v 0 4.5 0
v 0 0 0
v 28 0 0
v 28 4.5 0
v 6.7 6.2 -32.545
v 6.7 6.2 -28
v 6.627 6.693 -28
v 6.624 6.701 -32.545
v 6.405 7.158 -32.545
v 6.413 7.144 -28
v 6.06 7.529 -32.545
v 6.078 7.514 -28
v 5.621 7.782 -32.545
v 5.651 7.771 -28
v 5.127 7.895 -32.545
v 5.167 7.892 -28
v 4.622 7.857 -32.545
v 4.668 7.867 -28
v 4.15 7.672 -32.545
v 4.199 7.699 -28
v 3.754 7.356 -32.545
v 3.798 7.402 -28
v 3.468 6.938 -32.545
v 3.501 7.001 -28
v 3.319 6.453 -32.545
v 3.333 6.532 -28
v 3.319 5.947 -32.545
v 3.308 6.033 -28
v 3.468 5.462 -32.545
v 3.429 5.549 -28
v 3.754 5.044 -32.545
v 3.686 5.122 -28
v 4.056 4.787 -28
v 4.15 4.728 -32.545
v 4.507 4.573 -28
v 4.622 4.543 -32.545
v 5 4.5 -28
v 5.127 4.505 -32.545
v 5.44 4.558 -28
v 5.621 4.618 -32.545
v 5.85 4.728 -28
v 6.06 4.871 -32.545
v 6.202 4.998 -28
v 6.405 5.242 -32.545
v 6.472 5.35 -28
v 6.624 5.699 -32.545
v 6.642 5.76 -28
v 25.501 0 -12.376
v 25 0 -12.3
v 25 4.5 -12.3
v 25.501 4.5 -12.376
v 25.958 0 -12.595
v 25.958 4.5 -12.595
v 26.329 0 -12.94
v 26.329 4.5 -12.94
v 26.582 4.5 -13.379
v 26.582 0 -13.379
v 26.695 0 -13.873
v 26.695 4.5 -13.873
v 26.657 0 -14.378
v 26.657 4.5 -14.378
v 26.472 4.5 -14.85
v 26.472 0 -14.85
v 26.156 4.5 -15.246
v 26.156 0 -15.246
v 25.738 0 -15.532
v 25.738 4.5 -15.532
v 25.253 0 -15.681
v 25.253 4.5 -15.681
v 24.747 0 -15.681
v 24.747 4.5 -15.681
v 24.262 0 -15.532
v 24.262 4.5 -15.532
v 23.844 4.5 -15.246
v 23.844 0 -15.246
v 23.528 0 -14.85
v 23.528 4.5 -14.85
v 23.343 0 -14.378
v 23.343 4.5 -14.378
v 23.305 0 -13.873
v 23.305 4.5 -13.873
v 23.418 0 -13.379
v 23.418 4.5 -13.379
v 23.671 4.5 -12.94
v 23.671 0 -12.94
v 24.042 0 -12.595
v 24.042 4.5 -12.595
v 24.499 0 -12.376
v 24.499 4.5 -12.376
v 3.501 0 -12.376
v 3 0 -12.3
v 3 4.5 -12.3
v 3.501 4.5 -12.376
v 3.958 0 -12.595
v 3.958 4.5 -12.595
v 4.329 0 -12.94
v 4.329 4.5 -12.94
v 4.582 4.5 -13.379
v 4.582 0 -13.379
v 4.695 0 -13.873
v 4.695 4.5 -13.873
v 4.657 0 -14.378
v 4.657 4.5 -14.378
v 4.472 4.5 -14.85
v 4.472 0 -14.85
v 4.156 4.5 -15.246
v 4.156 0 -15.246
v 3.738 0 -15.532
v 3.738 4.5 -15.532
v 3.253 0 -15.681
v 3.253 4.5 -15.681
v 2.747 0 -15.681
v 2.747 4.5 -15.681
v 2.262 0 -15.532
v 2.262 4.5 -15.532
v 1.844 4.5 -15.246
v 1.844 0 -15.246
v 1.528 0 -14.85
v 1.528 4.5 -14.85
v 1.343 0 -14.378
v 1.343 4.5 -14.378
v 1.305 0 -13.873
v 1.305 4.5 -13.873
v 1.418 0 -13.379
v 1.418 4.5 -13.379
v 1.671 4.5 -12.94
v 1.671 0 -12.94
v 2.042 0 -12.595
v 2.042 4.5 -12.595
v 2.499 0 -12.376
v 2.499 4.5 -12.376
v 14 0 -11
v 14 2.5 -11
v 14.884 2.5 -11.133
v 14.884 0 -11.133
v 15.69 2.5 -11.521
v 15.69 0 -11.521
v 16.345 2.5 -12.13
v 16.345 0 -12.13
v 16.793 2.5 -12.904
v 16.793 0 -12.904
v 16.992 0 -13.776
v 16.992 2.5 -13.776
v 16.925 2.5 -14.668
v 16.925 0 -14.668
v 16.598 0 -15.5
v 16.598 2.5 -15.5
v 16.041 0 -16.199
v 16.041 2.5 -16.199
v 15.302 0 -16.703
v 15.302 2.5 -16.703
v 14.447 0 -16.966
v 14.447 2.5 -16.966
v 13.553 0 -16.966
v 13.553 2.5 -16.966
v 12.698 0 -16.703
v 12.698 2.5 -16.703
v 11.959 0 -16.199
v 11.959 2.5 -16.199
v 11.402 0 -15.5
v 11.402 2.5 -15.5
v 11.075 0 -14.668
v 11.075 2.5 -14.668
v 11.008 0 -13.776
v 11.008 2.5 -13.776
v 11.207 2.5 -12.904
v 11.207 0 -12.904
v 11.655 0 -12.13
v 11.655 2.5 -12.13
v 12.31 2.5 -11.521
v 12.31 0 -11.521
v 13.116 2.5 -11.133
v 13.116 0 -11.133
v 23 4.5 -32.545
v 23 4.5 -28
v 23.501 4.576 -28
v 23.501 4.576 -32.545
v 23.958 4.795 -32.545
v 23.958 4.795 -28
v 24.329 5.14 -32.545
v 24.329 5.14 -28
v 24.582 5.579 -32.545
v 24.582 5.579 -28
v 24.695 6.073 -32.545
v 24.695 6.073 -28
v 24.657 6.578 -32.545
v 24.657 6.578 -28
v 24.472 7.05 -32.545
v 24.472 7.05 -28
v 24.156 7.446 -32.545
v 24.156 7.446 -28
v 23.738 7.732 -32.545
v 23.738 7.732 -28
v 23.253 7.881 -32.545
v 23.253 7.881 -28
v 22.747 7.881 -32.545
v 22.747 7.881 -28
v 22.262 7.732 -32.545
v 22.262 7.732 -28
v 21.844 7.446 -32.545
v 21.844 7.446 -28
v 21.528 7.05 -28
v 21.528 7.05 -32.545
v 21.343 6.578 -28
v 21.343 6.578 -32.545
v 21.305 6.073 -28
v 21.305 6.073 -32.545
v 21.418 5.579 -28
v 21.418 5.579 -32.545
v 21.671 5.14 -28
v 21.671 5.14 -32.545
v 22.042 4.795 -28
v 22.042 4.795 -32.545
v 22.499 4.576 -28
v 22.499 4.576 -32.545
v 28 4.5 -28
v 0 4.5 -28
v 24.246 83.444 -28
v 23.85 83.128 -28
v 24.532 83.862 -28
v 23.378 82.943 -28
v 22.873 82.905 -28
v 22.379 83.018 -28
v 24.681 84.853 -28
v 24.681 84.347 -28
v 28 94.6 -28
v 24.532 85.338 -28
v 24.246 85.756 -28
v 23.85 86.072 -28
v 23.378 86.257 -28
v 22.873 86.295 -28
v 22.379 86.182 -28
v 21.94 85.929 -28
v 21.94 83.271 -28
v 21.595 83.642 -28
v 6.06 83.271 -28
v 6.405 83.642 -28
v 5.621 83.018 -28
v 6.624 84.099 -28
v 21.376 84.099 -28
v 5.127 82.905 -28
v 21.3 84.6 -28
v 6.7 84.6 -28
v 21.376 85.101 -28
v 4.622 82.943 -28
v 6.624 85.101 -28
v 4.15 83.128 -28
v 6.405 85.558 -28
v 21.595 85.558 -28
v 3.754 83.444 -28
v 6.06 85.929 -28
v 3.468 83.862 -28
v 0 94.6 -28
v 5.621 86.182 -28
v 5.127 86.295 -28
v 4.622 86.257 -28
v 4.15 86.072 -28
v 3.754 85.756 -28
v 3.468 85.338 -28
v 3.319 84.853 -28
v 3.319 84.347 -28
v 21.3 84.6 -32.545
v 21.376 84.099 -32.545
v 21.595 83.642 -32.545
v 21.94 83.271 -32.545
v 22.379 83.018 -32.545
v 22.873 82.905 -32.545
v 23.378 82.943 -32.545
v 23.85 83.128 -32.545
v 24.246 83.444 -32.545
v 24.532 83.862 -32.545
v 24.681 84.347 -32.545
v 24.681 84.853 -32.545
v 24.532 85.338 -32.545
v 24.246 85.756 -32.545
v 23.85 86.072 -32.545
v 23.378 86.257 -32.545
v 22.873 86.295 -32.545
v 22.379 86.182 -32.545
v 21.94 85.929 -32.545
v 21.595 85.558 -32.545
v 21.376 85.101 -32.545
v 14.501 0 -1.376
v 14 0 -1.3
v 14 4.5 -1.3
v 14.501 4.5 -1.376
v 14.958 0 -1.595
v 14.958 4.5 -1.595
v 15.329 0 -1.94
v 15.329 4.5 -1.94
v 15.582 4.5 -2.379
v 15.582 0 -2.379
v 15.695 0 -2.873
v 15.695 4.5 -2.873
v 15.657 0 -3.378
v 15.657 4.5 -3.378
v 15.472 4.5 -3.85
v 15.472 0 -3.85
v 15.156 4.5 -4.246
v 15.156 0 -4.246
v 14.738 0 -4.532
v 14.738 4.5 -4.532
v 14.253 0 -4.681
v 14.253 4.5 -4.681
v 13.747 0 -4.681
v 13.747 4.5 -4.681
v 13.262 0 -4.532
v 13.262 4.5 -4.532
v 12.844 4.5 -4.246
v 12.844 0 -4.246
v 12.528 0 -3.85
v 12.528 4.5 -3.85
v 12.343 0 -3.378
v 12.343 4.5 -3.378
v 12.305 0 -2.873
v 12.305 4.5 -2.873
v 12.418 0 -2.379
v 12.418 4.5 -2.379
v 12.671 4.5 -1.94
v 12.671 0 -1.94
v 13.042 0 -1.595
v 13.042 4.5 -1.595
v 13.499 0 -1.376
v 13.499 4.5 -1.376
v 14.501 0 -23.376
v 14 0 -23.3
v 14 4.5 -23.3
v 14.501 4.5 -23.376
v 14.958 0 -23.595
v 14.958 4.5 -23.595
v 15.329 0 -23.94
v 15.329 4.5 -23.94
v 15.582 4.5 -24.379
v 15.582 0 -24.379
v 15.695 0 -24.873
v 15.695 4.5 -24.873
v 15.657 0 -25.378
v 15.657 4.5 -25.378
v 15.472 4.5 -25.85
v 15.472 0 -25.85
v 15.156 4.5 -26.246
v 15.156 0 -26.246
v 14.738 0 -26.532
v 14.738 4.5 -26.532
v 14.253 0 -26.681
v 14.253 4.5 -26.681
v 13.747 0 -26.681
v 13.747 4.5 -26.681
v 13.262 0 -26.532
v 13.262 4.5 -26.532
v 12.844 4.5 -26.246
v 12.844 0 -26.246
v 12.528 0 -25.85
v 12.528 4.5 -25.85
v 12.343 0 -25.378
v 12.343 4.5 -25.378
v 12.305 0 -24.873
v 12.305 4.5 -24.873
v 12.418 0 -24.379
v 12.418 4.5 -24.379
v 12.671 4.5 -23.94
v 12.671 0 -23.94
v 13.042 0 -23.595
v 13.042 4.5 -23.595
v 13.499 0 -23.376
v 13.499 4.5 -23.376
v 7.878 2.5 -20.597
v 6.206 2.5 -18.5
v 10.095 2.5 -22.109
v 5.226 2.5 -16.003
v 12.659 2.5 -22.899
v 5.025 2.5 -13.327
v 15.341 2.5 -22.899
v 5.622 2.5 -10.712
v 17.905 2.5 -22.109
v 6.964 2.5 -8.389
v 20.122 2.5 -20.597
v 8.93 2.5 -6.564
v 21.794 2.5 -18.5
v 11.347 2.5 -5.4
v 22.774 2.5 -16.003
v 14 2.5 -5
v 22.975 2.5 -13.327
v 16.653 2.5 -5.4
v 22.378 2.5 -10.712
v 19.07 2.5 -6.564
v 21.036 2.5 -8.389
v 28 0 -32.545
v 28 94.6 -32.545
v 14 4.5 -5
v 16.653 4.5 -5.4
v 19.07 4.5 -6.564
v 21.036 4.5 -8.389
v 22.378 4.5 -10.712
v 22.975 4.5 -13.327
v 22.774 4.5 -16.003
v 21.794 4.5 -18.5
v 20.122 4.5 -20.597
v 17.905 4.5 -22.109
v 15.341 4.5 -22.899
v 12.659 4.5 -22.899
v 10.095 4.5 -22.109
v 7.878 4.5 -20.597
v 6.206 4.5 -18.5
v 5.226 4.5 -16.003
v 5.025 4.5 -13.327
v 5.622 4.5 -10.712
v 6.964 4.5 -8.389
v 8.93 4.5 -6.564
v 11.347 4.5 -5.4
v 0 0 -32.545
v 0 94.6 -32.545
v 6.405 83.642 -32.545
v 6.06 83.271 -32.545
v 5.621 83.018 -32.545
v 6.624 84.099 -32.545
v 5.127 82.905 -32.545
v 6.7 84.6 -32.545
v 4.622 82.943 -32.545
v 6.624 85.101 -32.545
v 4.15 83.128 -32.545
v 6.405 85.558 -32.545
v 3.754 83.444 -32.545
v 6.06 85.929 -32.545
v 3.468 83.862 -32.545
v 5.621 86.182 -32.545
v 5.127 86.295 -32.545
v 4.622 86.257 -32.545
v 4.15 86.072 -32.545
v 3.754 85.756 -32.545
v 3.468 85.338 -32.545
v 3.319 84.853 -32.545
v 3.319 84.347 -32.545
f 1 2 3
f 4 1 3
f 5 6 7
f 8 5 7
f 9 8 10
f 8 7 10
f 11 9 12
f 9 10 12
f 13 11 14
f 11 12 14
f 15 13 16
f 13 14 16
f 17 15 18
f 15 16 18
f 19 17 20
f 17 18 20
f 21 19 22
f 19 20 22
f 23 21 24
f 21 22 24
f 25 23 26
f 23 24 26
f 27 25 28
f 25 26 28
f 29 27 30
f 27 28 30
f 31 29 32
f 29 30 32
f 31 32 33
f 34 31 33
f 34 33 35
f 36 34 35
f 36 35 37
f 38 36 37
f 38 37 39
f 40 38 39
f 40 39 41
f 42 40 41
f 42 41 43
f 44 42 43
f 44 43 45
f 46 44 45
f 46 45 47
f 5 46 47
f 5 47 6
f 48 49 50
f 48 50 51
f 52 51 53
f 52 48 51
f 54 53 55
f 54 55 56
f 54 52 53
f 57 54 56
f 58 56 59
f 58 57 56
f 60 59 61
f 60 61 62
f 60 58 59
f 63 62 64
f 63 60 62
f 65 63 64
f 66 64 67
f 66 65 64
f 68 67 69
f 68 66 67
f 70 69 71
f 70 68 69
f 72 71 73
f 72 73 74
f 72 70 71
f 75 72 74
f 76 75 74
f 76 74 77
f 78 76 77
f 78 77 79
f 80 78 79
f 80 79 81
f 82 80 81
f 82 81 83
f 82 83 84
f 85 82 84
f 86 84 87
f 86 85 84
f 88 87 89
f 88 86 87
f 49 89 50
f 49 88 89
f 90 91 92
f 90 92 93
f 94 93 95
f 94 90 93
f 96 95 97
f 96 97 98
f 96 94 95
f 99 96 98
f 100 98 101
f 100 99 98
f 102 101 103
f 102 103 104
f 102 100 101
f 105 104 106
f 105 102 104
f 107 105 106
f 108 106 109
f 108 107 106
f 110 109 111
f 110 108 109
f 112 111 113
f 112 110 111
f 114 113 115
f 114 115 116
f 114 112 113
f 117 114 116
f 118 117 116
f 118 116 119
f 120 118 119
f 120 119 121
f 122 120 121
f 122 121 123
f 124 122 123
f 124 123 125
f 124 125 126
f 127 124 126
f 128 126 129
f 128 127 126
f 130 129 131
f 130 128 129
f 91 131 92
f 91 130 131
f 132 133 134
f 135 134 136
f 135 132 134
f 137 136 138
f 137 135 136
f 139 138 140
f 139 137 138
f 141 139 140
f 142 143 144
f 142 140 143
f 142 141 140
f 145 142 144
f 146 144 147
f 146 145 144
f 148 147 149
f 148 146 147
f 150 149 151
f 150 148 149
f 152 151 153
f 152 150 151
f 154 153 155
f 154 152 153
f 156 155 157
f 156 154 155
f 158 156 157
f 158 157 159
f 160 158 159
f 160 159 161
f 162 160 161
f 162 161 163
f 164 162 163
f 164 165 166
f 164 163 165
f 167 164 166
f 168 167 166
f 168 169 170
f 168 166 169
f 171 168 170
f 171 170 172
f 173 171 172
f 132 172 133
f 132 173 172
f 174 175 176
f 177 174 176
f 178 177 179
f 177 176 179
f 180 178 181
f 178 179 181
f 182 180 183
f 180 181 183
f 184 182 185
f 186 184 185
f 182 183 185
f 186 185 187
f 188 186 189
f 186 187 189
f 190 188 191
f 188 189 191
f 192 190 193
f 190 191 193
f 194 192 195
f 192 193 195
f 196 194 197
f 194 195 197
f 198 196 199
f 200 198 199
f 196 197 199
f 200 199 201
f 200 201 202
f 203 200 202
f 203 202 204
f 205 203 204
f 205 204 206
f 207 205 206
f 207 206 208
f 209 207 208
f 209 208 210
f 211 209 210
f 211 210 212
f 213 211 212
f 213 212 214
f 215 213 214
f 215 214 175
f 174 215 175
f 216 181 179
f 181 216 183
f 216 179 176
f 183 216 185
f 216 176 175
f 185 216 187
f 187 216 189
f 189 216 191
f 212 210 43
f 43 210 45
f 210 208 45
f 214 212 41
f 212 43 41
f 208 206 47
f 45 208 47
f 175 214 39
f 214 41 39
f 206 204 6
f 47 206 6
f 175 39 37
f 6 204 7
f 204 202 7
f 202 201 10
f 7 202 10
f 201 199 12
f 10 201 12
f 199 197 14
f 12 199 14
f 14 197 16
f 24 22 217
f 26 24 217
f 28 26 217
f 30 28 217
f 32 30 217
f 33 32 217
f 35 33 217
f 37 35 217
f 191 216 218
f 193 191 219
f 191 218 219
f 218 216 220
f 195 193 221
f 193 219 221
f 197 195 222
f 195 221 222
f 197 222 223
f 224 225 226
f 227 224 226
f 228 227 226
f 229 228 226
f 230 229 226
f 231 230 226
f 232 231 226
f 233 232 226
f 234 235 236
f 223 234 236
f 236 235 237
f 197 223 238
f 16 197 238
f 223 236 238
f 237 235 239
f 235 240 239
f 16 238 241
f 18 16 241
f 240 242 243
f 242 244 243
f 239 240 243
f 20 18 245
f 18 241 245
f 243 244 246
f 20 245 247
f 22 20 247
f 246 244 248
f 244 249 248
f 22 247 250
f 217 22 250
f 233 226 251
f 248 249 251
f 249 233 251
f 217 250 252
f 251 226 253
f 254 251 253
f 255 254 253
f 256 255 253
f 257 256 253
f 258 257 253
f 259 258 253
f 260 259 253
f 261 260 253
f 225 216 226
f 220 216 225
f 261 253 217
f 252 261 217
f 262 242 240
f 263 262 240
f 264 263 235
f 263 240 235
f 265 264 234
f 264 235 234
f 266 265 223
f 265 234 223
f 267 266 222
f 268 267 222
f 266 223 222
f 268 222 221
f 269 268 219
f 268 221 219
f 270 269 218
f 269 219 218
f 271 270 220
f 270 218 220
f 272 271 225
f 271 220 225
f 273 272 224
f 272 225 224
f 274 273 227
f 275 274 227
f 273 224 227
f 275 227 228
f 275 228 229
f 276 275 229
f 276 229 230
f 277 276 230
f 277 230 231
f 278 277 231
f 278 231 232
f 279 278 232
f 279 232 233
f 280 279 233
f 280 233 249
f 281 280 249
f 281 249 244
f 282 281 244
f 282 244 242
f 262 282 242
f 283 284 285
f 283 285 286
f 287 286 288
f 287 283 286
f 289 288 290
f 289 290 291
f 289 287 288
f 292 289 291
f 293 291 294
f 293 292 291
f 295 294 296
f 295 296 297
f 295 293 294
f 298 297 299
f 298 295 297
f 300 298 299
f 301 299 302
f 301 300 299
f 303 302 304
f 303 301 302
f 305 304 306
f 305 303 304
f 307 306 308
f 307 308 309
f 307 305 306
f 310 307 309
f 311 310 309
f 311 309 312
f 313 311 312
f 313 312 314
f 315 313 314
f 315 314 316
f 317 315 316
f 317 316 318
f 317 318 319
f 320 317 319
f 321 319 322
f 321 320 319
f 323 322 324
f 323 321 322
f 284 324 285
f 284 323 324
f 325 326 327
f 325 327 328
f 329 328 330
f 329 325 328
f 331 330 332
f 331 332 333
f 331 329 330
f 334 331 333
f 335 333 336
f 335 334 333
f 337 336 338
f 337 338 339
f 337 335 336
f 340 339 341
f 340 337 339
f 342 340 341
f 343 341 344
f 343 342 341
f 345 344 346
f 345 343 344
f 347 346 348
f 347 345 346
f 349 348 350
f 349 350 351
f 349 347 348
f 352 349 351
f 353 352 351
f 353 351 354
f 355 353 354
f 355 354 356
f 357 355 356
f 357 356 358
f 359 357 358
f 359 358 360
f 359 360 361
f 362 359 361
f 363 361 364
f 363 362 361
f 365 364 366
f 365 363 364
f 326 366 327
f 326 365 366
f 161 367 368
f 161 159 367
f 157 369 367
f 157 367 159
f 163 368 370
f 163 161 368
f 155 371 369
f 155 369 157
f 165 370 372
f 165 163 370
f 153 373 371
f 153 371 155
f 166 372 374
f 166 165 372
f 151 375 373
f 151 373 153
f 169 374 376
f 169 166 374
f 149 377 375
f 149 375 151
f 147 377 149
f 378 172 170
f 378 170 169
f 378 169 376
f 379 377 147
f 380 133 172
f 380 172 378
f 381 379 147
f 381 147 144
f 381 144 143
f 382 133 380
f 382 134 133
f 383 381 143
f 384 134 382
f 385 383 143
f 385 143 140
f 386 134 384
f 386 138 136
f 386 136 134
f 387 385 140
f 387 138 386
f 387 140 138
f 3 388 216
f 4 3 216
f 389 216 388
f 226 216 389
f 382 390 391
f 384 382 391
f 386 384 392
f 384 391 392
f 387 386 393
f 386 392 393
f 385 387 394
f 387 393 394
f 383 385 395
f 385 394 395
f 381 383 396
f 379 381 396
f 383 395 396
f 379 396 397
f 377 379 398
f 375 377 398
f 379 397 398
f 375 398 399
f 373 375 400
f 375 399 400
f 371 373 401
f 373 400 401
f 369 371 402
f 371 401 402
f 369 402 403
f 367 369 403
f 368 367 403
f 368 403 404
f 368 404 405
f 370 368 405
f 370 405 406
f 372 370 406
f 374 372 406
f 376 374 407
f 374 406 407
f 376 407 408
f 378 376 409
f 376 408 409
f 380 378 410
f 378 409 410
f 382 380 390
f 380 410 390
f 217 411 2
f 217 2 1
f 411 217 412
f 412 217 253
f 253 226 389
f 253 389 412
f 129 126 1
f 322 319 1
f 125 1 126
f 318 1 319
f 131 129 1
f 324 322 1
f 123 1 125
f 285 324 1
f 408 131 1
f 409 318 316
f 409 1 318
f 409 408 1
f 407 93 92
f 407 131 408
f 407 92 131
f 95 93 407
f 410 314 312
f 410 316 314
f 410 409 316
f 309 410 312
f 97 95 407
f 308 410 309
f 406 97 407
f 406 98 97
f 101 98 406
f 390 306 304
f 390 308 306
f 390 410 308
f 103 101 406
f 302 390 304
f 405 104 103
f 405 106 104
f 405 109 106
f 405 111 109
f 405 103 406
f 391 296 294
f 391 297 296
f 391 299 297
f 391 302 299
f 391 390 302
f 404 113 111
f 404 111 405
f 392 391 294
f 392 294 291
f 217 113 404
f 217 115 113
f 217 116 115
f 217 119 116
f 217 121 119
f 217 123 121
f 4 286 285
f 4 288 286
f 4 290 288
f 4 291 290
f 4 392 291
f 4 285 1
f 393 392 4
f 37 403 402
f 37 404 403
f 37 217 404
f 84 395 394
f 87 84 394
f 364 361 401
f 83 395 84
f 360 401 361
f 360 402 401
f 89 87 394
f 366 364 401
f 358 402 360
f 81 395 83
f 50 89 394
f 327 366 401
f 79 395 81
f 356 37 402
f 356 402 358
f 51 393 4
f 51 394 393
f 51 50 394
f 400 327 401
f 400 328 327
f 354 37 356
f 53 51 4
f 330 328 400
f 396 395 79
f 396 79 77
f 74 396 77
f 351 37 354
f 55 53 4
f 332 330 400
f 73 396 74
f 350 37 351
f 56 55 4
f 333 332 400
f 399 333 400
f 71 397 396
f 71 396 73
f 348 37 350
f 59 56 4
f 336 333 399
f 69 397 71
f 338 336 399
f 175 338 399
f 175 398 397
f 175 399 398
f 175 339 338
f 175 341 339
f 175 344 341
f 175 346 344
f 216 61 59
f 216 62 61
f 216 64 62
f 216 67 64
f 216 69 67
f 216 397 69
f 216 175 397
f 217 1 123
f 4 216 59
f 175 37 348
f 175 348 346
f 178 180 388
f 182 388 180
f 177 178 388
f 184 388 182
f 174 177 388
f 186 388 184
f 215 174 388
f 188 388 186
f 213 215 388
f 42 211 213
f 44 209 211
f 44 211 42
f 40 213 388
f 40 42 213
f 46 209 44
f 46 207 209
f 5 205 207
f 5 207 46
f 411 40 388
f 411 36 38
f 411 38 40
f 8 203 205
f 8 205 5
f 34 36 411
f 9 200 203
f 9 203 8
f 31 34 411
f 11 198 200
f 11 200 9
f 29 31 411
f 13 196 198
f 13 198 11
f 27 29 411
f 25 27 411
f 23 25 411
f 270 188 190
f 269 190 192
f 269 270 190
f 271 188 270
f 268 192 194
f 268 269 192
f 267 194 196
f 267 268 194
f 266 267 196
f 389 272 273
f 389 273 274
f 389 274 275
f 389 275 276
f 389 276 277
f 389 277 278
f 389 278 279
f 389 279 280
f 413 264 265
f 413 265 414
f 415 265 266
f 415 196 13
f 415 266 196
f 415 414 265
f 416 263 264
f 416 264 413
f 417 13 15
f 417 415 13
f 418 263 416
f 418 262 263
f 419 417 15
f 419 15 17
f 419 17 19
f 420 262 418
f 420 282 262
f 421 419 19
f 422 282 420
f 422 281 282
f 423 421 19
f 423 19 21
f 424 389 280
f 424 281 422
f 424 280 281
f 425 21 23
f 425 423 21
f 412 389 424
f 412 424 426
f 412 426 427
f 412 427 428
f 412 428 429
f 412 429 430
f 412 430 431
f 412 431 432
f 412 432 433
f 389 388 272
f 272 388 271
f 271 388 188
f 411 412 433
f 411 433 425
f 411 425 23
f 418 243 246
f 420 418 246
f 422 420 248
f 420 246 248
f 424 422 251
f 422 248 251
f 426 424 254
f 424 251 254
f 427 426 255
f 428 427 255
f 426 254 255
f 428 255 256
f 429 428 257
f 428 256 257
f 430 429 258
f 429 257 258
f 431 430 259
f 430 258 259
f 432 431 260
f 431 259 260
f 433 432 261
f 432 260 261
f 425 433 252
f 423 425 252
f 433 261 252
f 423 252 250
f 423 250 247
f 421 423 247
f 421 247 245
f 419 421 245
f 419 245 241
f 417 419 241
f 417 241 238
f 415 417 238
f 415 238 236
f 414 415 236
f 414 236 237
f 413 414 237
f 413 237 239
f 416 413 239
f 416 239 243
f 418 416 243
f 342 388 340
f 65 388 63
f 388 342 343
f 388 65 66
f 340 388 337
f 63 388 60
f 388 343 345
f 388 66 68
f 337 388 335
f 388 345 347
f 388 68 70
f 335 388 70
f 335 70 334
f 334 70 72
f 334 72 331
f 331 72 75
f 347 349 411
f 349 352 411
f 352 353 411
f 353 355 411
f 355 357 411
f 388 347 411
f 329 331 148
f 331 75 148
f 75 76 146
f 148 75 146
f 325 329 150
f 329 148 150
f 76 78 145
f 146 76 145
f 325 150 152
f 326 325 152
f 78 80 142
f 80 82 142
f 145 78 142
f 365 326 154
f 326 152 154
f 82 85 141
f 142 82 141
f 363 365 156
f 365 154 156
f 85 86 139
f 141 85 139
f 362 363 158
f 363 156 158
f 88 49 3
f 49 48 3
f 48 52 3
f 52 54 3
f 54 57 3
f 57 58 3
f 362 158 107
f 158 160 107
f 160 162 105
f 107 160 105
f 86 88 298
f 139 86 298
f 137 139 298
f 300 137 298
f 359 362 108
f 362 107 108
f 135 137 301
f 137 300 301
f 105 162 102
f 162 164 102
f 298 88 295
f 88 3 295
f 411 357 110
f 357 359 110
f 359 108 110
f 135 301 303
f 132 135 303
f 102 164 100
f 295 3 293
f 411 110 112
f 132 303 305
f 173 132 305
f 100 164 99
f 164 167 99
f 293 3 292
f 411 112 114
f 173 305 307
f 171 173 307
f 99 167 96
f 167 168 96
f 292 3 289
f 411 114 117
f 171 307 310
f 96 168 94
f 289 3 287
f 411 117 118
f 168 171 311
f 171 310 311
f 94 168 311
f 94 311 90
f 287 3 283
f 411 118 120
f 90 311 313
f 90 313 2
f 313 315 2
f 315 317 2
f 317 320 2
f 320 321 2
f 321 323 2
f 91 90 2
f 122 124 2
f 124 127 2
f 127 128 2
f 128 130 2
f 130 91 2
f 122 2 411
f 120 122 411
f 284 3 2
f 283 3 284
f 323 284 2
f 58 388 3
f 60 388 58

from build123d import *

# Parameters (mm, degrees)
SKETCH1_W           = 28
SKETCH1_H           = 28
SKETCH1_R           = 3
SKETCH1_R_2         = 1.7
BOSS_EXTRUDE1_DEPTH = 4.5
SKETCH2_W           = 28
SKETCH2_H           = 94.6
BOSS_EXTRUDE2_DEPTH = 4.545037206
SKETCH3_R           = 1.7
CUT_EXTRUDE1_DEPTH  = 103.553205703
SKETCH5_R           = 9
CUT_EXTRUDE2_DEPTH  = 2


with BuildPart() as part:
    # Sketch1 → Boss-Extrude1 (new body)
    with BuildSketch(Plane(origin=(0, 0, 0), x_dir=(1, 0, 0), z_dir=(0, 1, 0))):
        with Locations((14, 14)):
            Rectangle(SKETCH1_W, SKETCH1_H)
        with Locations(Location((14, 14, 0), (0, 0, 270))):
            Circle(SKETCH1_R, mode=Mode.SUBTRACT)
        with Locations(Location((14, 25, 0), (0, 0, 270))):
            Circle(SKETCH1_R_2, mode=Mode.SUBTRACT)
        with Locations(Location((25, 14, 0), (0, 0, 270))):
            Circle(SKETCH1_R_2, mode=Mode.SUBTRACT)
        with Locations(Location((14, 3, 0), (0, 0, 270))):
            Circle(SKETCH1_R_2, mode=Mode.SUBTRACT)
        with Locations(Location((3, 14, 0), (0, 0, 270))):
            Circle(SKETCH1_R_2, mode=Mode.SUBTRACT)
    extrude(amount=BOSS_EXTRUDE1_DEPTH)

    # Sketch2 → Boss-Extrude2 (add)
    with BuildSketch(Plane(origin=(0, 0, -28), x_dir=(-1, 0, 0), z_dir=(0, 0, -1))):
        with Locations((-14, 47.3)):
            Rectangle(SKETCH2_W, SKETCH2_H)
    extrude(amount=BOSS_EXTRUDE2_DEPTH)

    # Sketch3 → Cut-Extrude1 (cut, through all)
    with BuildSketch(Plane.XY.offset(-28)):
        with Locations((5, 6.2)):
            Circle(SKETCH3_R)
        with Locations((5, 84.6)):
            Circle(SKETCH3_R)
        with Locations(Location((23, 6.2, 0), (0, 0, 270))):
            Circle(SKETCH3_R)
        with Locations(Location((23, 84.6, 0), (0, 0, 180))):
            Circle(SKETCH3_R)
    extrude(amount=-CUT_EXTRUDE1_DEPTH, mode=Mode.SUBTRACT)

    # Sketch5 → Cut-Extrude2 (cut)
    with BuildSketch(Plane(origin=(0, 4.5, 0), x_dir=(1, 0, 0), z_dir=(0, 1, 0))):
        with Locations(Location((14, 14, 0), (0, 0, 270))):
            Circle(SKETCH5_R)
    extrude(amount=-CUT_EXTRUDE2_DEPTH, mode=Mode.SUBTRACT)


solid = part.part
